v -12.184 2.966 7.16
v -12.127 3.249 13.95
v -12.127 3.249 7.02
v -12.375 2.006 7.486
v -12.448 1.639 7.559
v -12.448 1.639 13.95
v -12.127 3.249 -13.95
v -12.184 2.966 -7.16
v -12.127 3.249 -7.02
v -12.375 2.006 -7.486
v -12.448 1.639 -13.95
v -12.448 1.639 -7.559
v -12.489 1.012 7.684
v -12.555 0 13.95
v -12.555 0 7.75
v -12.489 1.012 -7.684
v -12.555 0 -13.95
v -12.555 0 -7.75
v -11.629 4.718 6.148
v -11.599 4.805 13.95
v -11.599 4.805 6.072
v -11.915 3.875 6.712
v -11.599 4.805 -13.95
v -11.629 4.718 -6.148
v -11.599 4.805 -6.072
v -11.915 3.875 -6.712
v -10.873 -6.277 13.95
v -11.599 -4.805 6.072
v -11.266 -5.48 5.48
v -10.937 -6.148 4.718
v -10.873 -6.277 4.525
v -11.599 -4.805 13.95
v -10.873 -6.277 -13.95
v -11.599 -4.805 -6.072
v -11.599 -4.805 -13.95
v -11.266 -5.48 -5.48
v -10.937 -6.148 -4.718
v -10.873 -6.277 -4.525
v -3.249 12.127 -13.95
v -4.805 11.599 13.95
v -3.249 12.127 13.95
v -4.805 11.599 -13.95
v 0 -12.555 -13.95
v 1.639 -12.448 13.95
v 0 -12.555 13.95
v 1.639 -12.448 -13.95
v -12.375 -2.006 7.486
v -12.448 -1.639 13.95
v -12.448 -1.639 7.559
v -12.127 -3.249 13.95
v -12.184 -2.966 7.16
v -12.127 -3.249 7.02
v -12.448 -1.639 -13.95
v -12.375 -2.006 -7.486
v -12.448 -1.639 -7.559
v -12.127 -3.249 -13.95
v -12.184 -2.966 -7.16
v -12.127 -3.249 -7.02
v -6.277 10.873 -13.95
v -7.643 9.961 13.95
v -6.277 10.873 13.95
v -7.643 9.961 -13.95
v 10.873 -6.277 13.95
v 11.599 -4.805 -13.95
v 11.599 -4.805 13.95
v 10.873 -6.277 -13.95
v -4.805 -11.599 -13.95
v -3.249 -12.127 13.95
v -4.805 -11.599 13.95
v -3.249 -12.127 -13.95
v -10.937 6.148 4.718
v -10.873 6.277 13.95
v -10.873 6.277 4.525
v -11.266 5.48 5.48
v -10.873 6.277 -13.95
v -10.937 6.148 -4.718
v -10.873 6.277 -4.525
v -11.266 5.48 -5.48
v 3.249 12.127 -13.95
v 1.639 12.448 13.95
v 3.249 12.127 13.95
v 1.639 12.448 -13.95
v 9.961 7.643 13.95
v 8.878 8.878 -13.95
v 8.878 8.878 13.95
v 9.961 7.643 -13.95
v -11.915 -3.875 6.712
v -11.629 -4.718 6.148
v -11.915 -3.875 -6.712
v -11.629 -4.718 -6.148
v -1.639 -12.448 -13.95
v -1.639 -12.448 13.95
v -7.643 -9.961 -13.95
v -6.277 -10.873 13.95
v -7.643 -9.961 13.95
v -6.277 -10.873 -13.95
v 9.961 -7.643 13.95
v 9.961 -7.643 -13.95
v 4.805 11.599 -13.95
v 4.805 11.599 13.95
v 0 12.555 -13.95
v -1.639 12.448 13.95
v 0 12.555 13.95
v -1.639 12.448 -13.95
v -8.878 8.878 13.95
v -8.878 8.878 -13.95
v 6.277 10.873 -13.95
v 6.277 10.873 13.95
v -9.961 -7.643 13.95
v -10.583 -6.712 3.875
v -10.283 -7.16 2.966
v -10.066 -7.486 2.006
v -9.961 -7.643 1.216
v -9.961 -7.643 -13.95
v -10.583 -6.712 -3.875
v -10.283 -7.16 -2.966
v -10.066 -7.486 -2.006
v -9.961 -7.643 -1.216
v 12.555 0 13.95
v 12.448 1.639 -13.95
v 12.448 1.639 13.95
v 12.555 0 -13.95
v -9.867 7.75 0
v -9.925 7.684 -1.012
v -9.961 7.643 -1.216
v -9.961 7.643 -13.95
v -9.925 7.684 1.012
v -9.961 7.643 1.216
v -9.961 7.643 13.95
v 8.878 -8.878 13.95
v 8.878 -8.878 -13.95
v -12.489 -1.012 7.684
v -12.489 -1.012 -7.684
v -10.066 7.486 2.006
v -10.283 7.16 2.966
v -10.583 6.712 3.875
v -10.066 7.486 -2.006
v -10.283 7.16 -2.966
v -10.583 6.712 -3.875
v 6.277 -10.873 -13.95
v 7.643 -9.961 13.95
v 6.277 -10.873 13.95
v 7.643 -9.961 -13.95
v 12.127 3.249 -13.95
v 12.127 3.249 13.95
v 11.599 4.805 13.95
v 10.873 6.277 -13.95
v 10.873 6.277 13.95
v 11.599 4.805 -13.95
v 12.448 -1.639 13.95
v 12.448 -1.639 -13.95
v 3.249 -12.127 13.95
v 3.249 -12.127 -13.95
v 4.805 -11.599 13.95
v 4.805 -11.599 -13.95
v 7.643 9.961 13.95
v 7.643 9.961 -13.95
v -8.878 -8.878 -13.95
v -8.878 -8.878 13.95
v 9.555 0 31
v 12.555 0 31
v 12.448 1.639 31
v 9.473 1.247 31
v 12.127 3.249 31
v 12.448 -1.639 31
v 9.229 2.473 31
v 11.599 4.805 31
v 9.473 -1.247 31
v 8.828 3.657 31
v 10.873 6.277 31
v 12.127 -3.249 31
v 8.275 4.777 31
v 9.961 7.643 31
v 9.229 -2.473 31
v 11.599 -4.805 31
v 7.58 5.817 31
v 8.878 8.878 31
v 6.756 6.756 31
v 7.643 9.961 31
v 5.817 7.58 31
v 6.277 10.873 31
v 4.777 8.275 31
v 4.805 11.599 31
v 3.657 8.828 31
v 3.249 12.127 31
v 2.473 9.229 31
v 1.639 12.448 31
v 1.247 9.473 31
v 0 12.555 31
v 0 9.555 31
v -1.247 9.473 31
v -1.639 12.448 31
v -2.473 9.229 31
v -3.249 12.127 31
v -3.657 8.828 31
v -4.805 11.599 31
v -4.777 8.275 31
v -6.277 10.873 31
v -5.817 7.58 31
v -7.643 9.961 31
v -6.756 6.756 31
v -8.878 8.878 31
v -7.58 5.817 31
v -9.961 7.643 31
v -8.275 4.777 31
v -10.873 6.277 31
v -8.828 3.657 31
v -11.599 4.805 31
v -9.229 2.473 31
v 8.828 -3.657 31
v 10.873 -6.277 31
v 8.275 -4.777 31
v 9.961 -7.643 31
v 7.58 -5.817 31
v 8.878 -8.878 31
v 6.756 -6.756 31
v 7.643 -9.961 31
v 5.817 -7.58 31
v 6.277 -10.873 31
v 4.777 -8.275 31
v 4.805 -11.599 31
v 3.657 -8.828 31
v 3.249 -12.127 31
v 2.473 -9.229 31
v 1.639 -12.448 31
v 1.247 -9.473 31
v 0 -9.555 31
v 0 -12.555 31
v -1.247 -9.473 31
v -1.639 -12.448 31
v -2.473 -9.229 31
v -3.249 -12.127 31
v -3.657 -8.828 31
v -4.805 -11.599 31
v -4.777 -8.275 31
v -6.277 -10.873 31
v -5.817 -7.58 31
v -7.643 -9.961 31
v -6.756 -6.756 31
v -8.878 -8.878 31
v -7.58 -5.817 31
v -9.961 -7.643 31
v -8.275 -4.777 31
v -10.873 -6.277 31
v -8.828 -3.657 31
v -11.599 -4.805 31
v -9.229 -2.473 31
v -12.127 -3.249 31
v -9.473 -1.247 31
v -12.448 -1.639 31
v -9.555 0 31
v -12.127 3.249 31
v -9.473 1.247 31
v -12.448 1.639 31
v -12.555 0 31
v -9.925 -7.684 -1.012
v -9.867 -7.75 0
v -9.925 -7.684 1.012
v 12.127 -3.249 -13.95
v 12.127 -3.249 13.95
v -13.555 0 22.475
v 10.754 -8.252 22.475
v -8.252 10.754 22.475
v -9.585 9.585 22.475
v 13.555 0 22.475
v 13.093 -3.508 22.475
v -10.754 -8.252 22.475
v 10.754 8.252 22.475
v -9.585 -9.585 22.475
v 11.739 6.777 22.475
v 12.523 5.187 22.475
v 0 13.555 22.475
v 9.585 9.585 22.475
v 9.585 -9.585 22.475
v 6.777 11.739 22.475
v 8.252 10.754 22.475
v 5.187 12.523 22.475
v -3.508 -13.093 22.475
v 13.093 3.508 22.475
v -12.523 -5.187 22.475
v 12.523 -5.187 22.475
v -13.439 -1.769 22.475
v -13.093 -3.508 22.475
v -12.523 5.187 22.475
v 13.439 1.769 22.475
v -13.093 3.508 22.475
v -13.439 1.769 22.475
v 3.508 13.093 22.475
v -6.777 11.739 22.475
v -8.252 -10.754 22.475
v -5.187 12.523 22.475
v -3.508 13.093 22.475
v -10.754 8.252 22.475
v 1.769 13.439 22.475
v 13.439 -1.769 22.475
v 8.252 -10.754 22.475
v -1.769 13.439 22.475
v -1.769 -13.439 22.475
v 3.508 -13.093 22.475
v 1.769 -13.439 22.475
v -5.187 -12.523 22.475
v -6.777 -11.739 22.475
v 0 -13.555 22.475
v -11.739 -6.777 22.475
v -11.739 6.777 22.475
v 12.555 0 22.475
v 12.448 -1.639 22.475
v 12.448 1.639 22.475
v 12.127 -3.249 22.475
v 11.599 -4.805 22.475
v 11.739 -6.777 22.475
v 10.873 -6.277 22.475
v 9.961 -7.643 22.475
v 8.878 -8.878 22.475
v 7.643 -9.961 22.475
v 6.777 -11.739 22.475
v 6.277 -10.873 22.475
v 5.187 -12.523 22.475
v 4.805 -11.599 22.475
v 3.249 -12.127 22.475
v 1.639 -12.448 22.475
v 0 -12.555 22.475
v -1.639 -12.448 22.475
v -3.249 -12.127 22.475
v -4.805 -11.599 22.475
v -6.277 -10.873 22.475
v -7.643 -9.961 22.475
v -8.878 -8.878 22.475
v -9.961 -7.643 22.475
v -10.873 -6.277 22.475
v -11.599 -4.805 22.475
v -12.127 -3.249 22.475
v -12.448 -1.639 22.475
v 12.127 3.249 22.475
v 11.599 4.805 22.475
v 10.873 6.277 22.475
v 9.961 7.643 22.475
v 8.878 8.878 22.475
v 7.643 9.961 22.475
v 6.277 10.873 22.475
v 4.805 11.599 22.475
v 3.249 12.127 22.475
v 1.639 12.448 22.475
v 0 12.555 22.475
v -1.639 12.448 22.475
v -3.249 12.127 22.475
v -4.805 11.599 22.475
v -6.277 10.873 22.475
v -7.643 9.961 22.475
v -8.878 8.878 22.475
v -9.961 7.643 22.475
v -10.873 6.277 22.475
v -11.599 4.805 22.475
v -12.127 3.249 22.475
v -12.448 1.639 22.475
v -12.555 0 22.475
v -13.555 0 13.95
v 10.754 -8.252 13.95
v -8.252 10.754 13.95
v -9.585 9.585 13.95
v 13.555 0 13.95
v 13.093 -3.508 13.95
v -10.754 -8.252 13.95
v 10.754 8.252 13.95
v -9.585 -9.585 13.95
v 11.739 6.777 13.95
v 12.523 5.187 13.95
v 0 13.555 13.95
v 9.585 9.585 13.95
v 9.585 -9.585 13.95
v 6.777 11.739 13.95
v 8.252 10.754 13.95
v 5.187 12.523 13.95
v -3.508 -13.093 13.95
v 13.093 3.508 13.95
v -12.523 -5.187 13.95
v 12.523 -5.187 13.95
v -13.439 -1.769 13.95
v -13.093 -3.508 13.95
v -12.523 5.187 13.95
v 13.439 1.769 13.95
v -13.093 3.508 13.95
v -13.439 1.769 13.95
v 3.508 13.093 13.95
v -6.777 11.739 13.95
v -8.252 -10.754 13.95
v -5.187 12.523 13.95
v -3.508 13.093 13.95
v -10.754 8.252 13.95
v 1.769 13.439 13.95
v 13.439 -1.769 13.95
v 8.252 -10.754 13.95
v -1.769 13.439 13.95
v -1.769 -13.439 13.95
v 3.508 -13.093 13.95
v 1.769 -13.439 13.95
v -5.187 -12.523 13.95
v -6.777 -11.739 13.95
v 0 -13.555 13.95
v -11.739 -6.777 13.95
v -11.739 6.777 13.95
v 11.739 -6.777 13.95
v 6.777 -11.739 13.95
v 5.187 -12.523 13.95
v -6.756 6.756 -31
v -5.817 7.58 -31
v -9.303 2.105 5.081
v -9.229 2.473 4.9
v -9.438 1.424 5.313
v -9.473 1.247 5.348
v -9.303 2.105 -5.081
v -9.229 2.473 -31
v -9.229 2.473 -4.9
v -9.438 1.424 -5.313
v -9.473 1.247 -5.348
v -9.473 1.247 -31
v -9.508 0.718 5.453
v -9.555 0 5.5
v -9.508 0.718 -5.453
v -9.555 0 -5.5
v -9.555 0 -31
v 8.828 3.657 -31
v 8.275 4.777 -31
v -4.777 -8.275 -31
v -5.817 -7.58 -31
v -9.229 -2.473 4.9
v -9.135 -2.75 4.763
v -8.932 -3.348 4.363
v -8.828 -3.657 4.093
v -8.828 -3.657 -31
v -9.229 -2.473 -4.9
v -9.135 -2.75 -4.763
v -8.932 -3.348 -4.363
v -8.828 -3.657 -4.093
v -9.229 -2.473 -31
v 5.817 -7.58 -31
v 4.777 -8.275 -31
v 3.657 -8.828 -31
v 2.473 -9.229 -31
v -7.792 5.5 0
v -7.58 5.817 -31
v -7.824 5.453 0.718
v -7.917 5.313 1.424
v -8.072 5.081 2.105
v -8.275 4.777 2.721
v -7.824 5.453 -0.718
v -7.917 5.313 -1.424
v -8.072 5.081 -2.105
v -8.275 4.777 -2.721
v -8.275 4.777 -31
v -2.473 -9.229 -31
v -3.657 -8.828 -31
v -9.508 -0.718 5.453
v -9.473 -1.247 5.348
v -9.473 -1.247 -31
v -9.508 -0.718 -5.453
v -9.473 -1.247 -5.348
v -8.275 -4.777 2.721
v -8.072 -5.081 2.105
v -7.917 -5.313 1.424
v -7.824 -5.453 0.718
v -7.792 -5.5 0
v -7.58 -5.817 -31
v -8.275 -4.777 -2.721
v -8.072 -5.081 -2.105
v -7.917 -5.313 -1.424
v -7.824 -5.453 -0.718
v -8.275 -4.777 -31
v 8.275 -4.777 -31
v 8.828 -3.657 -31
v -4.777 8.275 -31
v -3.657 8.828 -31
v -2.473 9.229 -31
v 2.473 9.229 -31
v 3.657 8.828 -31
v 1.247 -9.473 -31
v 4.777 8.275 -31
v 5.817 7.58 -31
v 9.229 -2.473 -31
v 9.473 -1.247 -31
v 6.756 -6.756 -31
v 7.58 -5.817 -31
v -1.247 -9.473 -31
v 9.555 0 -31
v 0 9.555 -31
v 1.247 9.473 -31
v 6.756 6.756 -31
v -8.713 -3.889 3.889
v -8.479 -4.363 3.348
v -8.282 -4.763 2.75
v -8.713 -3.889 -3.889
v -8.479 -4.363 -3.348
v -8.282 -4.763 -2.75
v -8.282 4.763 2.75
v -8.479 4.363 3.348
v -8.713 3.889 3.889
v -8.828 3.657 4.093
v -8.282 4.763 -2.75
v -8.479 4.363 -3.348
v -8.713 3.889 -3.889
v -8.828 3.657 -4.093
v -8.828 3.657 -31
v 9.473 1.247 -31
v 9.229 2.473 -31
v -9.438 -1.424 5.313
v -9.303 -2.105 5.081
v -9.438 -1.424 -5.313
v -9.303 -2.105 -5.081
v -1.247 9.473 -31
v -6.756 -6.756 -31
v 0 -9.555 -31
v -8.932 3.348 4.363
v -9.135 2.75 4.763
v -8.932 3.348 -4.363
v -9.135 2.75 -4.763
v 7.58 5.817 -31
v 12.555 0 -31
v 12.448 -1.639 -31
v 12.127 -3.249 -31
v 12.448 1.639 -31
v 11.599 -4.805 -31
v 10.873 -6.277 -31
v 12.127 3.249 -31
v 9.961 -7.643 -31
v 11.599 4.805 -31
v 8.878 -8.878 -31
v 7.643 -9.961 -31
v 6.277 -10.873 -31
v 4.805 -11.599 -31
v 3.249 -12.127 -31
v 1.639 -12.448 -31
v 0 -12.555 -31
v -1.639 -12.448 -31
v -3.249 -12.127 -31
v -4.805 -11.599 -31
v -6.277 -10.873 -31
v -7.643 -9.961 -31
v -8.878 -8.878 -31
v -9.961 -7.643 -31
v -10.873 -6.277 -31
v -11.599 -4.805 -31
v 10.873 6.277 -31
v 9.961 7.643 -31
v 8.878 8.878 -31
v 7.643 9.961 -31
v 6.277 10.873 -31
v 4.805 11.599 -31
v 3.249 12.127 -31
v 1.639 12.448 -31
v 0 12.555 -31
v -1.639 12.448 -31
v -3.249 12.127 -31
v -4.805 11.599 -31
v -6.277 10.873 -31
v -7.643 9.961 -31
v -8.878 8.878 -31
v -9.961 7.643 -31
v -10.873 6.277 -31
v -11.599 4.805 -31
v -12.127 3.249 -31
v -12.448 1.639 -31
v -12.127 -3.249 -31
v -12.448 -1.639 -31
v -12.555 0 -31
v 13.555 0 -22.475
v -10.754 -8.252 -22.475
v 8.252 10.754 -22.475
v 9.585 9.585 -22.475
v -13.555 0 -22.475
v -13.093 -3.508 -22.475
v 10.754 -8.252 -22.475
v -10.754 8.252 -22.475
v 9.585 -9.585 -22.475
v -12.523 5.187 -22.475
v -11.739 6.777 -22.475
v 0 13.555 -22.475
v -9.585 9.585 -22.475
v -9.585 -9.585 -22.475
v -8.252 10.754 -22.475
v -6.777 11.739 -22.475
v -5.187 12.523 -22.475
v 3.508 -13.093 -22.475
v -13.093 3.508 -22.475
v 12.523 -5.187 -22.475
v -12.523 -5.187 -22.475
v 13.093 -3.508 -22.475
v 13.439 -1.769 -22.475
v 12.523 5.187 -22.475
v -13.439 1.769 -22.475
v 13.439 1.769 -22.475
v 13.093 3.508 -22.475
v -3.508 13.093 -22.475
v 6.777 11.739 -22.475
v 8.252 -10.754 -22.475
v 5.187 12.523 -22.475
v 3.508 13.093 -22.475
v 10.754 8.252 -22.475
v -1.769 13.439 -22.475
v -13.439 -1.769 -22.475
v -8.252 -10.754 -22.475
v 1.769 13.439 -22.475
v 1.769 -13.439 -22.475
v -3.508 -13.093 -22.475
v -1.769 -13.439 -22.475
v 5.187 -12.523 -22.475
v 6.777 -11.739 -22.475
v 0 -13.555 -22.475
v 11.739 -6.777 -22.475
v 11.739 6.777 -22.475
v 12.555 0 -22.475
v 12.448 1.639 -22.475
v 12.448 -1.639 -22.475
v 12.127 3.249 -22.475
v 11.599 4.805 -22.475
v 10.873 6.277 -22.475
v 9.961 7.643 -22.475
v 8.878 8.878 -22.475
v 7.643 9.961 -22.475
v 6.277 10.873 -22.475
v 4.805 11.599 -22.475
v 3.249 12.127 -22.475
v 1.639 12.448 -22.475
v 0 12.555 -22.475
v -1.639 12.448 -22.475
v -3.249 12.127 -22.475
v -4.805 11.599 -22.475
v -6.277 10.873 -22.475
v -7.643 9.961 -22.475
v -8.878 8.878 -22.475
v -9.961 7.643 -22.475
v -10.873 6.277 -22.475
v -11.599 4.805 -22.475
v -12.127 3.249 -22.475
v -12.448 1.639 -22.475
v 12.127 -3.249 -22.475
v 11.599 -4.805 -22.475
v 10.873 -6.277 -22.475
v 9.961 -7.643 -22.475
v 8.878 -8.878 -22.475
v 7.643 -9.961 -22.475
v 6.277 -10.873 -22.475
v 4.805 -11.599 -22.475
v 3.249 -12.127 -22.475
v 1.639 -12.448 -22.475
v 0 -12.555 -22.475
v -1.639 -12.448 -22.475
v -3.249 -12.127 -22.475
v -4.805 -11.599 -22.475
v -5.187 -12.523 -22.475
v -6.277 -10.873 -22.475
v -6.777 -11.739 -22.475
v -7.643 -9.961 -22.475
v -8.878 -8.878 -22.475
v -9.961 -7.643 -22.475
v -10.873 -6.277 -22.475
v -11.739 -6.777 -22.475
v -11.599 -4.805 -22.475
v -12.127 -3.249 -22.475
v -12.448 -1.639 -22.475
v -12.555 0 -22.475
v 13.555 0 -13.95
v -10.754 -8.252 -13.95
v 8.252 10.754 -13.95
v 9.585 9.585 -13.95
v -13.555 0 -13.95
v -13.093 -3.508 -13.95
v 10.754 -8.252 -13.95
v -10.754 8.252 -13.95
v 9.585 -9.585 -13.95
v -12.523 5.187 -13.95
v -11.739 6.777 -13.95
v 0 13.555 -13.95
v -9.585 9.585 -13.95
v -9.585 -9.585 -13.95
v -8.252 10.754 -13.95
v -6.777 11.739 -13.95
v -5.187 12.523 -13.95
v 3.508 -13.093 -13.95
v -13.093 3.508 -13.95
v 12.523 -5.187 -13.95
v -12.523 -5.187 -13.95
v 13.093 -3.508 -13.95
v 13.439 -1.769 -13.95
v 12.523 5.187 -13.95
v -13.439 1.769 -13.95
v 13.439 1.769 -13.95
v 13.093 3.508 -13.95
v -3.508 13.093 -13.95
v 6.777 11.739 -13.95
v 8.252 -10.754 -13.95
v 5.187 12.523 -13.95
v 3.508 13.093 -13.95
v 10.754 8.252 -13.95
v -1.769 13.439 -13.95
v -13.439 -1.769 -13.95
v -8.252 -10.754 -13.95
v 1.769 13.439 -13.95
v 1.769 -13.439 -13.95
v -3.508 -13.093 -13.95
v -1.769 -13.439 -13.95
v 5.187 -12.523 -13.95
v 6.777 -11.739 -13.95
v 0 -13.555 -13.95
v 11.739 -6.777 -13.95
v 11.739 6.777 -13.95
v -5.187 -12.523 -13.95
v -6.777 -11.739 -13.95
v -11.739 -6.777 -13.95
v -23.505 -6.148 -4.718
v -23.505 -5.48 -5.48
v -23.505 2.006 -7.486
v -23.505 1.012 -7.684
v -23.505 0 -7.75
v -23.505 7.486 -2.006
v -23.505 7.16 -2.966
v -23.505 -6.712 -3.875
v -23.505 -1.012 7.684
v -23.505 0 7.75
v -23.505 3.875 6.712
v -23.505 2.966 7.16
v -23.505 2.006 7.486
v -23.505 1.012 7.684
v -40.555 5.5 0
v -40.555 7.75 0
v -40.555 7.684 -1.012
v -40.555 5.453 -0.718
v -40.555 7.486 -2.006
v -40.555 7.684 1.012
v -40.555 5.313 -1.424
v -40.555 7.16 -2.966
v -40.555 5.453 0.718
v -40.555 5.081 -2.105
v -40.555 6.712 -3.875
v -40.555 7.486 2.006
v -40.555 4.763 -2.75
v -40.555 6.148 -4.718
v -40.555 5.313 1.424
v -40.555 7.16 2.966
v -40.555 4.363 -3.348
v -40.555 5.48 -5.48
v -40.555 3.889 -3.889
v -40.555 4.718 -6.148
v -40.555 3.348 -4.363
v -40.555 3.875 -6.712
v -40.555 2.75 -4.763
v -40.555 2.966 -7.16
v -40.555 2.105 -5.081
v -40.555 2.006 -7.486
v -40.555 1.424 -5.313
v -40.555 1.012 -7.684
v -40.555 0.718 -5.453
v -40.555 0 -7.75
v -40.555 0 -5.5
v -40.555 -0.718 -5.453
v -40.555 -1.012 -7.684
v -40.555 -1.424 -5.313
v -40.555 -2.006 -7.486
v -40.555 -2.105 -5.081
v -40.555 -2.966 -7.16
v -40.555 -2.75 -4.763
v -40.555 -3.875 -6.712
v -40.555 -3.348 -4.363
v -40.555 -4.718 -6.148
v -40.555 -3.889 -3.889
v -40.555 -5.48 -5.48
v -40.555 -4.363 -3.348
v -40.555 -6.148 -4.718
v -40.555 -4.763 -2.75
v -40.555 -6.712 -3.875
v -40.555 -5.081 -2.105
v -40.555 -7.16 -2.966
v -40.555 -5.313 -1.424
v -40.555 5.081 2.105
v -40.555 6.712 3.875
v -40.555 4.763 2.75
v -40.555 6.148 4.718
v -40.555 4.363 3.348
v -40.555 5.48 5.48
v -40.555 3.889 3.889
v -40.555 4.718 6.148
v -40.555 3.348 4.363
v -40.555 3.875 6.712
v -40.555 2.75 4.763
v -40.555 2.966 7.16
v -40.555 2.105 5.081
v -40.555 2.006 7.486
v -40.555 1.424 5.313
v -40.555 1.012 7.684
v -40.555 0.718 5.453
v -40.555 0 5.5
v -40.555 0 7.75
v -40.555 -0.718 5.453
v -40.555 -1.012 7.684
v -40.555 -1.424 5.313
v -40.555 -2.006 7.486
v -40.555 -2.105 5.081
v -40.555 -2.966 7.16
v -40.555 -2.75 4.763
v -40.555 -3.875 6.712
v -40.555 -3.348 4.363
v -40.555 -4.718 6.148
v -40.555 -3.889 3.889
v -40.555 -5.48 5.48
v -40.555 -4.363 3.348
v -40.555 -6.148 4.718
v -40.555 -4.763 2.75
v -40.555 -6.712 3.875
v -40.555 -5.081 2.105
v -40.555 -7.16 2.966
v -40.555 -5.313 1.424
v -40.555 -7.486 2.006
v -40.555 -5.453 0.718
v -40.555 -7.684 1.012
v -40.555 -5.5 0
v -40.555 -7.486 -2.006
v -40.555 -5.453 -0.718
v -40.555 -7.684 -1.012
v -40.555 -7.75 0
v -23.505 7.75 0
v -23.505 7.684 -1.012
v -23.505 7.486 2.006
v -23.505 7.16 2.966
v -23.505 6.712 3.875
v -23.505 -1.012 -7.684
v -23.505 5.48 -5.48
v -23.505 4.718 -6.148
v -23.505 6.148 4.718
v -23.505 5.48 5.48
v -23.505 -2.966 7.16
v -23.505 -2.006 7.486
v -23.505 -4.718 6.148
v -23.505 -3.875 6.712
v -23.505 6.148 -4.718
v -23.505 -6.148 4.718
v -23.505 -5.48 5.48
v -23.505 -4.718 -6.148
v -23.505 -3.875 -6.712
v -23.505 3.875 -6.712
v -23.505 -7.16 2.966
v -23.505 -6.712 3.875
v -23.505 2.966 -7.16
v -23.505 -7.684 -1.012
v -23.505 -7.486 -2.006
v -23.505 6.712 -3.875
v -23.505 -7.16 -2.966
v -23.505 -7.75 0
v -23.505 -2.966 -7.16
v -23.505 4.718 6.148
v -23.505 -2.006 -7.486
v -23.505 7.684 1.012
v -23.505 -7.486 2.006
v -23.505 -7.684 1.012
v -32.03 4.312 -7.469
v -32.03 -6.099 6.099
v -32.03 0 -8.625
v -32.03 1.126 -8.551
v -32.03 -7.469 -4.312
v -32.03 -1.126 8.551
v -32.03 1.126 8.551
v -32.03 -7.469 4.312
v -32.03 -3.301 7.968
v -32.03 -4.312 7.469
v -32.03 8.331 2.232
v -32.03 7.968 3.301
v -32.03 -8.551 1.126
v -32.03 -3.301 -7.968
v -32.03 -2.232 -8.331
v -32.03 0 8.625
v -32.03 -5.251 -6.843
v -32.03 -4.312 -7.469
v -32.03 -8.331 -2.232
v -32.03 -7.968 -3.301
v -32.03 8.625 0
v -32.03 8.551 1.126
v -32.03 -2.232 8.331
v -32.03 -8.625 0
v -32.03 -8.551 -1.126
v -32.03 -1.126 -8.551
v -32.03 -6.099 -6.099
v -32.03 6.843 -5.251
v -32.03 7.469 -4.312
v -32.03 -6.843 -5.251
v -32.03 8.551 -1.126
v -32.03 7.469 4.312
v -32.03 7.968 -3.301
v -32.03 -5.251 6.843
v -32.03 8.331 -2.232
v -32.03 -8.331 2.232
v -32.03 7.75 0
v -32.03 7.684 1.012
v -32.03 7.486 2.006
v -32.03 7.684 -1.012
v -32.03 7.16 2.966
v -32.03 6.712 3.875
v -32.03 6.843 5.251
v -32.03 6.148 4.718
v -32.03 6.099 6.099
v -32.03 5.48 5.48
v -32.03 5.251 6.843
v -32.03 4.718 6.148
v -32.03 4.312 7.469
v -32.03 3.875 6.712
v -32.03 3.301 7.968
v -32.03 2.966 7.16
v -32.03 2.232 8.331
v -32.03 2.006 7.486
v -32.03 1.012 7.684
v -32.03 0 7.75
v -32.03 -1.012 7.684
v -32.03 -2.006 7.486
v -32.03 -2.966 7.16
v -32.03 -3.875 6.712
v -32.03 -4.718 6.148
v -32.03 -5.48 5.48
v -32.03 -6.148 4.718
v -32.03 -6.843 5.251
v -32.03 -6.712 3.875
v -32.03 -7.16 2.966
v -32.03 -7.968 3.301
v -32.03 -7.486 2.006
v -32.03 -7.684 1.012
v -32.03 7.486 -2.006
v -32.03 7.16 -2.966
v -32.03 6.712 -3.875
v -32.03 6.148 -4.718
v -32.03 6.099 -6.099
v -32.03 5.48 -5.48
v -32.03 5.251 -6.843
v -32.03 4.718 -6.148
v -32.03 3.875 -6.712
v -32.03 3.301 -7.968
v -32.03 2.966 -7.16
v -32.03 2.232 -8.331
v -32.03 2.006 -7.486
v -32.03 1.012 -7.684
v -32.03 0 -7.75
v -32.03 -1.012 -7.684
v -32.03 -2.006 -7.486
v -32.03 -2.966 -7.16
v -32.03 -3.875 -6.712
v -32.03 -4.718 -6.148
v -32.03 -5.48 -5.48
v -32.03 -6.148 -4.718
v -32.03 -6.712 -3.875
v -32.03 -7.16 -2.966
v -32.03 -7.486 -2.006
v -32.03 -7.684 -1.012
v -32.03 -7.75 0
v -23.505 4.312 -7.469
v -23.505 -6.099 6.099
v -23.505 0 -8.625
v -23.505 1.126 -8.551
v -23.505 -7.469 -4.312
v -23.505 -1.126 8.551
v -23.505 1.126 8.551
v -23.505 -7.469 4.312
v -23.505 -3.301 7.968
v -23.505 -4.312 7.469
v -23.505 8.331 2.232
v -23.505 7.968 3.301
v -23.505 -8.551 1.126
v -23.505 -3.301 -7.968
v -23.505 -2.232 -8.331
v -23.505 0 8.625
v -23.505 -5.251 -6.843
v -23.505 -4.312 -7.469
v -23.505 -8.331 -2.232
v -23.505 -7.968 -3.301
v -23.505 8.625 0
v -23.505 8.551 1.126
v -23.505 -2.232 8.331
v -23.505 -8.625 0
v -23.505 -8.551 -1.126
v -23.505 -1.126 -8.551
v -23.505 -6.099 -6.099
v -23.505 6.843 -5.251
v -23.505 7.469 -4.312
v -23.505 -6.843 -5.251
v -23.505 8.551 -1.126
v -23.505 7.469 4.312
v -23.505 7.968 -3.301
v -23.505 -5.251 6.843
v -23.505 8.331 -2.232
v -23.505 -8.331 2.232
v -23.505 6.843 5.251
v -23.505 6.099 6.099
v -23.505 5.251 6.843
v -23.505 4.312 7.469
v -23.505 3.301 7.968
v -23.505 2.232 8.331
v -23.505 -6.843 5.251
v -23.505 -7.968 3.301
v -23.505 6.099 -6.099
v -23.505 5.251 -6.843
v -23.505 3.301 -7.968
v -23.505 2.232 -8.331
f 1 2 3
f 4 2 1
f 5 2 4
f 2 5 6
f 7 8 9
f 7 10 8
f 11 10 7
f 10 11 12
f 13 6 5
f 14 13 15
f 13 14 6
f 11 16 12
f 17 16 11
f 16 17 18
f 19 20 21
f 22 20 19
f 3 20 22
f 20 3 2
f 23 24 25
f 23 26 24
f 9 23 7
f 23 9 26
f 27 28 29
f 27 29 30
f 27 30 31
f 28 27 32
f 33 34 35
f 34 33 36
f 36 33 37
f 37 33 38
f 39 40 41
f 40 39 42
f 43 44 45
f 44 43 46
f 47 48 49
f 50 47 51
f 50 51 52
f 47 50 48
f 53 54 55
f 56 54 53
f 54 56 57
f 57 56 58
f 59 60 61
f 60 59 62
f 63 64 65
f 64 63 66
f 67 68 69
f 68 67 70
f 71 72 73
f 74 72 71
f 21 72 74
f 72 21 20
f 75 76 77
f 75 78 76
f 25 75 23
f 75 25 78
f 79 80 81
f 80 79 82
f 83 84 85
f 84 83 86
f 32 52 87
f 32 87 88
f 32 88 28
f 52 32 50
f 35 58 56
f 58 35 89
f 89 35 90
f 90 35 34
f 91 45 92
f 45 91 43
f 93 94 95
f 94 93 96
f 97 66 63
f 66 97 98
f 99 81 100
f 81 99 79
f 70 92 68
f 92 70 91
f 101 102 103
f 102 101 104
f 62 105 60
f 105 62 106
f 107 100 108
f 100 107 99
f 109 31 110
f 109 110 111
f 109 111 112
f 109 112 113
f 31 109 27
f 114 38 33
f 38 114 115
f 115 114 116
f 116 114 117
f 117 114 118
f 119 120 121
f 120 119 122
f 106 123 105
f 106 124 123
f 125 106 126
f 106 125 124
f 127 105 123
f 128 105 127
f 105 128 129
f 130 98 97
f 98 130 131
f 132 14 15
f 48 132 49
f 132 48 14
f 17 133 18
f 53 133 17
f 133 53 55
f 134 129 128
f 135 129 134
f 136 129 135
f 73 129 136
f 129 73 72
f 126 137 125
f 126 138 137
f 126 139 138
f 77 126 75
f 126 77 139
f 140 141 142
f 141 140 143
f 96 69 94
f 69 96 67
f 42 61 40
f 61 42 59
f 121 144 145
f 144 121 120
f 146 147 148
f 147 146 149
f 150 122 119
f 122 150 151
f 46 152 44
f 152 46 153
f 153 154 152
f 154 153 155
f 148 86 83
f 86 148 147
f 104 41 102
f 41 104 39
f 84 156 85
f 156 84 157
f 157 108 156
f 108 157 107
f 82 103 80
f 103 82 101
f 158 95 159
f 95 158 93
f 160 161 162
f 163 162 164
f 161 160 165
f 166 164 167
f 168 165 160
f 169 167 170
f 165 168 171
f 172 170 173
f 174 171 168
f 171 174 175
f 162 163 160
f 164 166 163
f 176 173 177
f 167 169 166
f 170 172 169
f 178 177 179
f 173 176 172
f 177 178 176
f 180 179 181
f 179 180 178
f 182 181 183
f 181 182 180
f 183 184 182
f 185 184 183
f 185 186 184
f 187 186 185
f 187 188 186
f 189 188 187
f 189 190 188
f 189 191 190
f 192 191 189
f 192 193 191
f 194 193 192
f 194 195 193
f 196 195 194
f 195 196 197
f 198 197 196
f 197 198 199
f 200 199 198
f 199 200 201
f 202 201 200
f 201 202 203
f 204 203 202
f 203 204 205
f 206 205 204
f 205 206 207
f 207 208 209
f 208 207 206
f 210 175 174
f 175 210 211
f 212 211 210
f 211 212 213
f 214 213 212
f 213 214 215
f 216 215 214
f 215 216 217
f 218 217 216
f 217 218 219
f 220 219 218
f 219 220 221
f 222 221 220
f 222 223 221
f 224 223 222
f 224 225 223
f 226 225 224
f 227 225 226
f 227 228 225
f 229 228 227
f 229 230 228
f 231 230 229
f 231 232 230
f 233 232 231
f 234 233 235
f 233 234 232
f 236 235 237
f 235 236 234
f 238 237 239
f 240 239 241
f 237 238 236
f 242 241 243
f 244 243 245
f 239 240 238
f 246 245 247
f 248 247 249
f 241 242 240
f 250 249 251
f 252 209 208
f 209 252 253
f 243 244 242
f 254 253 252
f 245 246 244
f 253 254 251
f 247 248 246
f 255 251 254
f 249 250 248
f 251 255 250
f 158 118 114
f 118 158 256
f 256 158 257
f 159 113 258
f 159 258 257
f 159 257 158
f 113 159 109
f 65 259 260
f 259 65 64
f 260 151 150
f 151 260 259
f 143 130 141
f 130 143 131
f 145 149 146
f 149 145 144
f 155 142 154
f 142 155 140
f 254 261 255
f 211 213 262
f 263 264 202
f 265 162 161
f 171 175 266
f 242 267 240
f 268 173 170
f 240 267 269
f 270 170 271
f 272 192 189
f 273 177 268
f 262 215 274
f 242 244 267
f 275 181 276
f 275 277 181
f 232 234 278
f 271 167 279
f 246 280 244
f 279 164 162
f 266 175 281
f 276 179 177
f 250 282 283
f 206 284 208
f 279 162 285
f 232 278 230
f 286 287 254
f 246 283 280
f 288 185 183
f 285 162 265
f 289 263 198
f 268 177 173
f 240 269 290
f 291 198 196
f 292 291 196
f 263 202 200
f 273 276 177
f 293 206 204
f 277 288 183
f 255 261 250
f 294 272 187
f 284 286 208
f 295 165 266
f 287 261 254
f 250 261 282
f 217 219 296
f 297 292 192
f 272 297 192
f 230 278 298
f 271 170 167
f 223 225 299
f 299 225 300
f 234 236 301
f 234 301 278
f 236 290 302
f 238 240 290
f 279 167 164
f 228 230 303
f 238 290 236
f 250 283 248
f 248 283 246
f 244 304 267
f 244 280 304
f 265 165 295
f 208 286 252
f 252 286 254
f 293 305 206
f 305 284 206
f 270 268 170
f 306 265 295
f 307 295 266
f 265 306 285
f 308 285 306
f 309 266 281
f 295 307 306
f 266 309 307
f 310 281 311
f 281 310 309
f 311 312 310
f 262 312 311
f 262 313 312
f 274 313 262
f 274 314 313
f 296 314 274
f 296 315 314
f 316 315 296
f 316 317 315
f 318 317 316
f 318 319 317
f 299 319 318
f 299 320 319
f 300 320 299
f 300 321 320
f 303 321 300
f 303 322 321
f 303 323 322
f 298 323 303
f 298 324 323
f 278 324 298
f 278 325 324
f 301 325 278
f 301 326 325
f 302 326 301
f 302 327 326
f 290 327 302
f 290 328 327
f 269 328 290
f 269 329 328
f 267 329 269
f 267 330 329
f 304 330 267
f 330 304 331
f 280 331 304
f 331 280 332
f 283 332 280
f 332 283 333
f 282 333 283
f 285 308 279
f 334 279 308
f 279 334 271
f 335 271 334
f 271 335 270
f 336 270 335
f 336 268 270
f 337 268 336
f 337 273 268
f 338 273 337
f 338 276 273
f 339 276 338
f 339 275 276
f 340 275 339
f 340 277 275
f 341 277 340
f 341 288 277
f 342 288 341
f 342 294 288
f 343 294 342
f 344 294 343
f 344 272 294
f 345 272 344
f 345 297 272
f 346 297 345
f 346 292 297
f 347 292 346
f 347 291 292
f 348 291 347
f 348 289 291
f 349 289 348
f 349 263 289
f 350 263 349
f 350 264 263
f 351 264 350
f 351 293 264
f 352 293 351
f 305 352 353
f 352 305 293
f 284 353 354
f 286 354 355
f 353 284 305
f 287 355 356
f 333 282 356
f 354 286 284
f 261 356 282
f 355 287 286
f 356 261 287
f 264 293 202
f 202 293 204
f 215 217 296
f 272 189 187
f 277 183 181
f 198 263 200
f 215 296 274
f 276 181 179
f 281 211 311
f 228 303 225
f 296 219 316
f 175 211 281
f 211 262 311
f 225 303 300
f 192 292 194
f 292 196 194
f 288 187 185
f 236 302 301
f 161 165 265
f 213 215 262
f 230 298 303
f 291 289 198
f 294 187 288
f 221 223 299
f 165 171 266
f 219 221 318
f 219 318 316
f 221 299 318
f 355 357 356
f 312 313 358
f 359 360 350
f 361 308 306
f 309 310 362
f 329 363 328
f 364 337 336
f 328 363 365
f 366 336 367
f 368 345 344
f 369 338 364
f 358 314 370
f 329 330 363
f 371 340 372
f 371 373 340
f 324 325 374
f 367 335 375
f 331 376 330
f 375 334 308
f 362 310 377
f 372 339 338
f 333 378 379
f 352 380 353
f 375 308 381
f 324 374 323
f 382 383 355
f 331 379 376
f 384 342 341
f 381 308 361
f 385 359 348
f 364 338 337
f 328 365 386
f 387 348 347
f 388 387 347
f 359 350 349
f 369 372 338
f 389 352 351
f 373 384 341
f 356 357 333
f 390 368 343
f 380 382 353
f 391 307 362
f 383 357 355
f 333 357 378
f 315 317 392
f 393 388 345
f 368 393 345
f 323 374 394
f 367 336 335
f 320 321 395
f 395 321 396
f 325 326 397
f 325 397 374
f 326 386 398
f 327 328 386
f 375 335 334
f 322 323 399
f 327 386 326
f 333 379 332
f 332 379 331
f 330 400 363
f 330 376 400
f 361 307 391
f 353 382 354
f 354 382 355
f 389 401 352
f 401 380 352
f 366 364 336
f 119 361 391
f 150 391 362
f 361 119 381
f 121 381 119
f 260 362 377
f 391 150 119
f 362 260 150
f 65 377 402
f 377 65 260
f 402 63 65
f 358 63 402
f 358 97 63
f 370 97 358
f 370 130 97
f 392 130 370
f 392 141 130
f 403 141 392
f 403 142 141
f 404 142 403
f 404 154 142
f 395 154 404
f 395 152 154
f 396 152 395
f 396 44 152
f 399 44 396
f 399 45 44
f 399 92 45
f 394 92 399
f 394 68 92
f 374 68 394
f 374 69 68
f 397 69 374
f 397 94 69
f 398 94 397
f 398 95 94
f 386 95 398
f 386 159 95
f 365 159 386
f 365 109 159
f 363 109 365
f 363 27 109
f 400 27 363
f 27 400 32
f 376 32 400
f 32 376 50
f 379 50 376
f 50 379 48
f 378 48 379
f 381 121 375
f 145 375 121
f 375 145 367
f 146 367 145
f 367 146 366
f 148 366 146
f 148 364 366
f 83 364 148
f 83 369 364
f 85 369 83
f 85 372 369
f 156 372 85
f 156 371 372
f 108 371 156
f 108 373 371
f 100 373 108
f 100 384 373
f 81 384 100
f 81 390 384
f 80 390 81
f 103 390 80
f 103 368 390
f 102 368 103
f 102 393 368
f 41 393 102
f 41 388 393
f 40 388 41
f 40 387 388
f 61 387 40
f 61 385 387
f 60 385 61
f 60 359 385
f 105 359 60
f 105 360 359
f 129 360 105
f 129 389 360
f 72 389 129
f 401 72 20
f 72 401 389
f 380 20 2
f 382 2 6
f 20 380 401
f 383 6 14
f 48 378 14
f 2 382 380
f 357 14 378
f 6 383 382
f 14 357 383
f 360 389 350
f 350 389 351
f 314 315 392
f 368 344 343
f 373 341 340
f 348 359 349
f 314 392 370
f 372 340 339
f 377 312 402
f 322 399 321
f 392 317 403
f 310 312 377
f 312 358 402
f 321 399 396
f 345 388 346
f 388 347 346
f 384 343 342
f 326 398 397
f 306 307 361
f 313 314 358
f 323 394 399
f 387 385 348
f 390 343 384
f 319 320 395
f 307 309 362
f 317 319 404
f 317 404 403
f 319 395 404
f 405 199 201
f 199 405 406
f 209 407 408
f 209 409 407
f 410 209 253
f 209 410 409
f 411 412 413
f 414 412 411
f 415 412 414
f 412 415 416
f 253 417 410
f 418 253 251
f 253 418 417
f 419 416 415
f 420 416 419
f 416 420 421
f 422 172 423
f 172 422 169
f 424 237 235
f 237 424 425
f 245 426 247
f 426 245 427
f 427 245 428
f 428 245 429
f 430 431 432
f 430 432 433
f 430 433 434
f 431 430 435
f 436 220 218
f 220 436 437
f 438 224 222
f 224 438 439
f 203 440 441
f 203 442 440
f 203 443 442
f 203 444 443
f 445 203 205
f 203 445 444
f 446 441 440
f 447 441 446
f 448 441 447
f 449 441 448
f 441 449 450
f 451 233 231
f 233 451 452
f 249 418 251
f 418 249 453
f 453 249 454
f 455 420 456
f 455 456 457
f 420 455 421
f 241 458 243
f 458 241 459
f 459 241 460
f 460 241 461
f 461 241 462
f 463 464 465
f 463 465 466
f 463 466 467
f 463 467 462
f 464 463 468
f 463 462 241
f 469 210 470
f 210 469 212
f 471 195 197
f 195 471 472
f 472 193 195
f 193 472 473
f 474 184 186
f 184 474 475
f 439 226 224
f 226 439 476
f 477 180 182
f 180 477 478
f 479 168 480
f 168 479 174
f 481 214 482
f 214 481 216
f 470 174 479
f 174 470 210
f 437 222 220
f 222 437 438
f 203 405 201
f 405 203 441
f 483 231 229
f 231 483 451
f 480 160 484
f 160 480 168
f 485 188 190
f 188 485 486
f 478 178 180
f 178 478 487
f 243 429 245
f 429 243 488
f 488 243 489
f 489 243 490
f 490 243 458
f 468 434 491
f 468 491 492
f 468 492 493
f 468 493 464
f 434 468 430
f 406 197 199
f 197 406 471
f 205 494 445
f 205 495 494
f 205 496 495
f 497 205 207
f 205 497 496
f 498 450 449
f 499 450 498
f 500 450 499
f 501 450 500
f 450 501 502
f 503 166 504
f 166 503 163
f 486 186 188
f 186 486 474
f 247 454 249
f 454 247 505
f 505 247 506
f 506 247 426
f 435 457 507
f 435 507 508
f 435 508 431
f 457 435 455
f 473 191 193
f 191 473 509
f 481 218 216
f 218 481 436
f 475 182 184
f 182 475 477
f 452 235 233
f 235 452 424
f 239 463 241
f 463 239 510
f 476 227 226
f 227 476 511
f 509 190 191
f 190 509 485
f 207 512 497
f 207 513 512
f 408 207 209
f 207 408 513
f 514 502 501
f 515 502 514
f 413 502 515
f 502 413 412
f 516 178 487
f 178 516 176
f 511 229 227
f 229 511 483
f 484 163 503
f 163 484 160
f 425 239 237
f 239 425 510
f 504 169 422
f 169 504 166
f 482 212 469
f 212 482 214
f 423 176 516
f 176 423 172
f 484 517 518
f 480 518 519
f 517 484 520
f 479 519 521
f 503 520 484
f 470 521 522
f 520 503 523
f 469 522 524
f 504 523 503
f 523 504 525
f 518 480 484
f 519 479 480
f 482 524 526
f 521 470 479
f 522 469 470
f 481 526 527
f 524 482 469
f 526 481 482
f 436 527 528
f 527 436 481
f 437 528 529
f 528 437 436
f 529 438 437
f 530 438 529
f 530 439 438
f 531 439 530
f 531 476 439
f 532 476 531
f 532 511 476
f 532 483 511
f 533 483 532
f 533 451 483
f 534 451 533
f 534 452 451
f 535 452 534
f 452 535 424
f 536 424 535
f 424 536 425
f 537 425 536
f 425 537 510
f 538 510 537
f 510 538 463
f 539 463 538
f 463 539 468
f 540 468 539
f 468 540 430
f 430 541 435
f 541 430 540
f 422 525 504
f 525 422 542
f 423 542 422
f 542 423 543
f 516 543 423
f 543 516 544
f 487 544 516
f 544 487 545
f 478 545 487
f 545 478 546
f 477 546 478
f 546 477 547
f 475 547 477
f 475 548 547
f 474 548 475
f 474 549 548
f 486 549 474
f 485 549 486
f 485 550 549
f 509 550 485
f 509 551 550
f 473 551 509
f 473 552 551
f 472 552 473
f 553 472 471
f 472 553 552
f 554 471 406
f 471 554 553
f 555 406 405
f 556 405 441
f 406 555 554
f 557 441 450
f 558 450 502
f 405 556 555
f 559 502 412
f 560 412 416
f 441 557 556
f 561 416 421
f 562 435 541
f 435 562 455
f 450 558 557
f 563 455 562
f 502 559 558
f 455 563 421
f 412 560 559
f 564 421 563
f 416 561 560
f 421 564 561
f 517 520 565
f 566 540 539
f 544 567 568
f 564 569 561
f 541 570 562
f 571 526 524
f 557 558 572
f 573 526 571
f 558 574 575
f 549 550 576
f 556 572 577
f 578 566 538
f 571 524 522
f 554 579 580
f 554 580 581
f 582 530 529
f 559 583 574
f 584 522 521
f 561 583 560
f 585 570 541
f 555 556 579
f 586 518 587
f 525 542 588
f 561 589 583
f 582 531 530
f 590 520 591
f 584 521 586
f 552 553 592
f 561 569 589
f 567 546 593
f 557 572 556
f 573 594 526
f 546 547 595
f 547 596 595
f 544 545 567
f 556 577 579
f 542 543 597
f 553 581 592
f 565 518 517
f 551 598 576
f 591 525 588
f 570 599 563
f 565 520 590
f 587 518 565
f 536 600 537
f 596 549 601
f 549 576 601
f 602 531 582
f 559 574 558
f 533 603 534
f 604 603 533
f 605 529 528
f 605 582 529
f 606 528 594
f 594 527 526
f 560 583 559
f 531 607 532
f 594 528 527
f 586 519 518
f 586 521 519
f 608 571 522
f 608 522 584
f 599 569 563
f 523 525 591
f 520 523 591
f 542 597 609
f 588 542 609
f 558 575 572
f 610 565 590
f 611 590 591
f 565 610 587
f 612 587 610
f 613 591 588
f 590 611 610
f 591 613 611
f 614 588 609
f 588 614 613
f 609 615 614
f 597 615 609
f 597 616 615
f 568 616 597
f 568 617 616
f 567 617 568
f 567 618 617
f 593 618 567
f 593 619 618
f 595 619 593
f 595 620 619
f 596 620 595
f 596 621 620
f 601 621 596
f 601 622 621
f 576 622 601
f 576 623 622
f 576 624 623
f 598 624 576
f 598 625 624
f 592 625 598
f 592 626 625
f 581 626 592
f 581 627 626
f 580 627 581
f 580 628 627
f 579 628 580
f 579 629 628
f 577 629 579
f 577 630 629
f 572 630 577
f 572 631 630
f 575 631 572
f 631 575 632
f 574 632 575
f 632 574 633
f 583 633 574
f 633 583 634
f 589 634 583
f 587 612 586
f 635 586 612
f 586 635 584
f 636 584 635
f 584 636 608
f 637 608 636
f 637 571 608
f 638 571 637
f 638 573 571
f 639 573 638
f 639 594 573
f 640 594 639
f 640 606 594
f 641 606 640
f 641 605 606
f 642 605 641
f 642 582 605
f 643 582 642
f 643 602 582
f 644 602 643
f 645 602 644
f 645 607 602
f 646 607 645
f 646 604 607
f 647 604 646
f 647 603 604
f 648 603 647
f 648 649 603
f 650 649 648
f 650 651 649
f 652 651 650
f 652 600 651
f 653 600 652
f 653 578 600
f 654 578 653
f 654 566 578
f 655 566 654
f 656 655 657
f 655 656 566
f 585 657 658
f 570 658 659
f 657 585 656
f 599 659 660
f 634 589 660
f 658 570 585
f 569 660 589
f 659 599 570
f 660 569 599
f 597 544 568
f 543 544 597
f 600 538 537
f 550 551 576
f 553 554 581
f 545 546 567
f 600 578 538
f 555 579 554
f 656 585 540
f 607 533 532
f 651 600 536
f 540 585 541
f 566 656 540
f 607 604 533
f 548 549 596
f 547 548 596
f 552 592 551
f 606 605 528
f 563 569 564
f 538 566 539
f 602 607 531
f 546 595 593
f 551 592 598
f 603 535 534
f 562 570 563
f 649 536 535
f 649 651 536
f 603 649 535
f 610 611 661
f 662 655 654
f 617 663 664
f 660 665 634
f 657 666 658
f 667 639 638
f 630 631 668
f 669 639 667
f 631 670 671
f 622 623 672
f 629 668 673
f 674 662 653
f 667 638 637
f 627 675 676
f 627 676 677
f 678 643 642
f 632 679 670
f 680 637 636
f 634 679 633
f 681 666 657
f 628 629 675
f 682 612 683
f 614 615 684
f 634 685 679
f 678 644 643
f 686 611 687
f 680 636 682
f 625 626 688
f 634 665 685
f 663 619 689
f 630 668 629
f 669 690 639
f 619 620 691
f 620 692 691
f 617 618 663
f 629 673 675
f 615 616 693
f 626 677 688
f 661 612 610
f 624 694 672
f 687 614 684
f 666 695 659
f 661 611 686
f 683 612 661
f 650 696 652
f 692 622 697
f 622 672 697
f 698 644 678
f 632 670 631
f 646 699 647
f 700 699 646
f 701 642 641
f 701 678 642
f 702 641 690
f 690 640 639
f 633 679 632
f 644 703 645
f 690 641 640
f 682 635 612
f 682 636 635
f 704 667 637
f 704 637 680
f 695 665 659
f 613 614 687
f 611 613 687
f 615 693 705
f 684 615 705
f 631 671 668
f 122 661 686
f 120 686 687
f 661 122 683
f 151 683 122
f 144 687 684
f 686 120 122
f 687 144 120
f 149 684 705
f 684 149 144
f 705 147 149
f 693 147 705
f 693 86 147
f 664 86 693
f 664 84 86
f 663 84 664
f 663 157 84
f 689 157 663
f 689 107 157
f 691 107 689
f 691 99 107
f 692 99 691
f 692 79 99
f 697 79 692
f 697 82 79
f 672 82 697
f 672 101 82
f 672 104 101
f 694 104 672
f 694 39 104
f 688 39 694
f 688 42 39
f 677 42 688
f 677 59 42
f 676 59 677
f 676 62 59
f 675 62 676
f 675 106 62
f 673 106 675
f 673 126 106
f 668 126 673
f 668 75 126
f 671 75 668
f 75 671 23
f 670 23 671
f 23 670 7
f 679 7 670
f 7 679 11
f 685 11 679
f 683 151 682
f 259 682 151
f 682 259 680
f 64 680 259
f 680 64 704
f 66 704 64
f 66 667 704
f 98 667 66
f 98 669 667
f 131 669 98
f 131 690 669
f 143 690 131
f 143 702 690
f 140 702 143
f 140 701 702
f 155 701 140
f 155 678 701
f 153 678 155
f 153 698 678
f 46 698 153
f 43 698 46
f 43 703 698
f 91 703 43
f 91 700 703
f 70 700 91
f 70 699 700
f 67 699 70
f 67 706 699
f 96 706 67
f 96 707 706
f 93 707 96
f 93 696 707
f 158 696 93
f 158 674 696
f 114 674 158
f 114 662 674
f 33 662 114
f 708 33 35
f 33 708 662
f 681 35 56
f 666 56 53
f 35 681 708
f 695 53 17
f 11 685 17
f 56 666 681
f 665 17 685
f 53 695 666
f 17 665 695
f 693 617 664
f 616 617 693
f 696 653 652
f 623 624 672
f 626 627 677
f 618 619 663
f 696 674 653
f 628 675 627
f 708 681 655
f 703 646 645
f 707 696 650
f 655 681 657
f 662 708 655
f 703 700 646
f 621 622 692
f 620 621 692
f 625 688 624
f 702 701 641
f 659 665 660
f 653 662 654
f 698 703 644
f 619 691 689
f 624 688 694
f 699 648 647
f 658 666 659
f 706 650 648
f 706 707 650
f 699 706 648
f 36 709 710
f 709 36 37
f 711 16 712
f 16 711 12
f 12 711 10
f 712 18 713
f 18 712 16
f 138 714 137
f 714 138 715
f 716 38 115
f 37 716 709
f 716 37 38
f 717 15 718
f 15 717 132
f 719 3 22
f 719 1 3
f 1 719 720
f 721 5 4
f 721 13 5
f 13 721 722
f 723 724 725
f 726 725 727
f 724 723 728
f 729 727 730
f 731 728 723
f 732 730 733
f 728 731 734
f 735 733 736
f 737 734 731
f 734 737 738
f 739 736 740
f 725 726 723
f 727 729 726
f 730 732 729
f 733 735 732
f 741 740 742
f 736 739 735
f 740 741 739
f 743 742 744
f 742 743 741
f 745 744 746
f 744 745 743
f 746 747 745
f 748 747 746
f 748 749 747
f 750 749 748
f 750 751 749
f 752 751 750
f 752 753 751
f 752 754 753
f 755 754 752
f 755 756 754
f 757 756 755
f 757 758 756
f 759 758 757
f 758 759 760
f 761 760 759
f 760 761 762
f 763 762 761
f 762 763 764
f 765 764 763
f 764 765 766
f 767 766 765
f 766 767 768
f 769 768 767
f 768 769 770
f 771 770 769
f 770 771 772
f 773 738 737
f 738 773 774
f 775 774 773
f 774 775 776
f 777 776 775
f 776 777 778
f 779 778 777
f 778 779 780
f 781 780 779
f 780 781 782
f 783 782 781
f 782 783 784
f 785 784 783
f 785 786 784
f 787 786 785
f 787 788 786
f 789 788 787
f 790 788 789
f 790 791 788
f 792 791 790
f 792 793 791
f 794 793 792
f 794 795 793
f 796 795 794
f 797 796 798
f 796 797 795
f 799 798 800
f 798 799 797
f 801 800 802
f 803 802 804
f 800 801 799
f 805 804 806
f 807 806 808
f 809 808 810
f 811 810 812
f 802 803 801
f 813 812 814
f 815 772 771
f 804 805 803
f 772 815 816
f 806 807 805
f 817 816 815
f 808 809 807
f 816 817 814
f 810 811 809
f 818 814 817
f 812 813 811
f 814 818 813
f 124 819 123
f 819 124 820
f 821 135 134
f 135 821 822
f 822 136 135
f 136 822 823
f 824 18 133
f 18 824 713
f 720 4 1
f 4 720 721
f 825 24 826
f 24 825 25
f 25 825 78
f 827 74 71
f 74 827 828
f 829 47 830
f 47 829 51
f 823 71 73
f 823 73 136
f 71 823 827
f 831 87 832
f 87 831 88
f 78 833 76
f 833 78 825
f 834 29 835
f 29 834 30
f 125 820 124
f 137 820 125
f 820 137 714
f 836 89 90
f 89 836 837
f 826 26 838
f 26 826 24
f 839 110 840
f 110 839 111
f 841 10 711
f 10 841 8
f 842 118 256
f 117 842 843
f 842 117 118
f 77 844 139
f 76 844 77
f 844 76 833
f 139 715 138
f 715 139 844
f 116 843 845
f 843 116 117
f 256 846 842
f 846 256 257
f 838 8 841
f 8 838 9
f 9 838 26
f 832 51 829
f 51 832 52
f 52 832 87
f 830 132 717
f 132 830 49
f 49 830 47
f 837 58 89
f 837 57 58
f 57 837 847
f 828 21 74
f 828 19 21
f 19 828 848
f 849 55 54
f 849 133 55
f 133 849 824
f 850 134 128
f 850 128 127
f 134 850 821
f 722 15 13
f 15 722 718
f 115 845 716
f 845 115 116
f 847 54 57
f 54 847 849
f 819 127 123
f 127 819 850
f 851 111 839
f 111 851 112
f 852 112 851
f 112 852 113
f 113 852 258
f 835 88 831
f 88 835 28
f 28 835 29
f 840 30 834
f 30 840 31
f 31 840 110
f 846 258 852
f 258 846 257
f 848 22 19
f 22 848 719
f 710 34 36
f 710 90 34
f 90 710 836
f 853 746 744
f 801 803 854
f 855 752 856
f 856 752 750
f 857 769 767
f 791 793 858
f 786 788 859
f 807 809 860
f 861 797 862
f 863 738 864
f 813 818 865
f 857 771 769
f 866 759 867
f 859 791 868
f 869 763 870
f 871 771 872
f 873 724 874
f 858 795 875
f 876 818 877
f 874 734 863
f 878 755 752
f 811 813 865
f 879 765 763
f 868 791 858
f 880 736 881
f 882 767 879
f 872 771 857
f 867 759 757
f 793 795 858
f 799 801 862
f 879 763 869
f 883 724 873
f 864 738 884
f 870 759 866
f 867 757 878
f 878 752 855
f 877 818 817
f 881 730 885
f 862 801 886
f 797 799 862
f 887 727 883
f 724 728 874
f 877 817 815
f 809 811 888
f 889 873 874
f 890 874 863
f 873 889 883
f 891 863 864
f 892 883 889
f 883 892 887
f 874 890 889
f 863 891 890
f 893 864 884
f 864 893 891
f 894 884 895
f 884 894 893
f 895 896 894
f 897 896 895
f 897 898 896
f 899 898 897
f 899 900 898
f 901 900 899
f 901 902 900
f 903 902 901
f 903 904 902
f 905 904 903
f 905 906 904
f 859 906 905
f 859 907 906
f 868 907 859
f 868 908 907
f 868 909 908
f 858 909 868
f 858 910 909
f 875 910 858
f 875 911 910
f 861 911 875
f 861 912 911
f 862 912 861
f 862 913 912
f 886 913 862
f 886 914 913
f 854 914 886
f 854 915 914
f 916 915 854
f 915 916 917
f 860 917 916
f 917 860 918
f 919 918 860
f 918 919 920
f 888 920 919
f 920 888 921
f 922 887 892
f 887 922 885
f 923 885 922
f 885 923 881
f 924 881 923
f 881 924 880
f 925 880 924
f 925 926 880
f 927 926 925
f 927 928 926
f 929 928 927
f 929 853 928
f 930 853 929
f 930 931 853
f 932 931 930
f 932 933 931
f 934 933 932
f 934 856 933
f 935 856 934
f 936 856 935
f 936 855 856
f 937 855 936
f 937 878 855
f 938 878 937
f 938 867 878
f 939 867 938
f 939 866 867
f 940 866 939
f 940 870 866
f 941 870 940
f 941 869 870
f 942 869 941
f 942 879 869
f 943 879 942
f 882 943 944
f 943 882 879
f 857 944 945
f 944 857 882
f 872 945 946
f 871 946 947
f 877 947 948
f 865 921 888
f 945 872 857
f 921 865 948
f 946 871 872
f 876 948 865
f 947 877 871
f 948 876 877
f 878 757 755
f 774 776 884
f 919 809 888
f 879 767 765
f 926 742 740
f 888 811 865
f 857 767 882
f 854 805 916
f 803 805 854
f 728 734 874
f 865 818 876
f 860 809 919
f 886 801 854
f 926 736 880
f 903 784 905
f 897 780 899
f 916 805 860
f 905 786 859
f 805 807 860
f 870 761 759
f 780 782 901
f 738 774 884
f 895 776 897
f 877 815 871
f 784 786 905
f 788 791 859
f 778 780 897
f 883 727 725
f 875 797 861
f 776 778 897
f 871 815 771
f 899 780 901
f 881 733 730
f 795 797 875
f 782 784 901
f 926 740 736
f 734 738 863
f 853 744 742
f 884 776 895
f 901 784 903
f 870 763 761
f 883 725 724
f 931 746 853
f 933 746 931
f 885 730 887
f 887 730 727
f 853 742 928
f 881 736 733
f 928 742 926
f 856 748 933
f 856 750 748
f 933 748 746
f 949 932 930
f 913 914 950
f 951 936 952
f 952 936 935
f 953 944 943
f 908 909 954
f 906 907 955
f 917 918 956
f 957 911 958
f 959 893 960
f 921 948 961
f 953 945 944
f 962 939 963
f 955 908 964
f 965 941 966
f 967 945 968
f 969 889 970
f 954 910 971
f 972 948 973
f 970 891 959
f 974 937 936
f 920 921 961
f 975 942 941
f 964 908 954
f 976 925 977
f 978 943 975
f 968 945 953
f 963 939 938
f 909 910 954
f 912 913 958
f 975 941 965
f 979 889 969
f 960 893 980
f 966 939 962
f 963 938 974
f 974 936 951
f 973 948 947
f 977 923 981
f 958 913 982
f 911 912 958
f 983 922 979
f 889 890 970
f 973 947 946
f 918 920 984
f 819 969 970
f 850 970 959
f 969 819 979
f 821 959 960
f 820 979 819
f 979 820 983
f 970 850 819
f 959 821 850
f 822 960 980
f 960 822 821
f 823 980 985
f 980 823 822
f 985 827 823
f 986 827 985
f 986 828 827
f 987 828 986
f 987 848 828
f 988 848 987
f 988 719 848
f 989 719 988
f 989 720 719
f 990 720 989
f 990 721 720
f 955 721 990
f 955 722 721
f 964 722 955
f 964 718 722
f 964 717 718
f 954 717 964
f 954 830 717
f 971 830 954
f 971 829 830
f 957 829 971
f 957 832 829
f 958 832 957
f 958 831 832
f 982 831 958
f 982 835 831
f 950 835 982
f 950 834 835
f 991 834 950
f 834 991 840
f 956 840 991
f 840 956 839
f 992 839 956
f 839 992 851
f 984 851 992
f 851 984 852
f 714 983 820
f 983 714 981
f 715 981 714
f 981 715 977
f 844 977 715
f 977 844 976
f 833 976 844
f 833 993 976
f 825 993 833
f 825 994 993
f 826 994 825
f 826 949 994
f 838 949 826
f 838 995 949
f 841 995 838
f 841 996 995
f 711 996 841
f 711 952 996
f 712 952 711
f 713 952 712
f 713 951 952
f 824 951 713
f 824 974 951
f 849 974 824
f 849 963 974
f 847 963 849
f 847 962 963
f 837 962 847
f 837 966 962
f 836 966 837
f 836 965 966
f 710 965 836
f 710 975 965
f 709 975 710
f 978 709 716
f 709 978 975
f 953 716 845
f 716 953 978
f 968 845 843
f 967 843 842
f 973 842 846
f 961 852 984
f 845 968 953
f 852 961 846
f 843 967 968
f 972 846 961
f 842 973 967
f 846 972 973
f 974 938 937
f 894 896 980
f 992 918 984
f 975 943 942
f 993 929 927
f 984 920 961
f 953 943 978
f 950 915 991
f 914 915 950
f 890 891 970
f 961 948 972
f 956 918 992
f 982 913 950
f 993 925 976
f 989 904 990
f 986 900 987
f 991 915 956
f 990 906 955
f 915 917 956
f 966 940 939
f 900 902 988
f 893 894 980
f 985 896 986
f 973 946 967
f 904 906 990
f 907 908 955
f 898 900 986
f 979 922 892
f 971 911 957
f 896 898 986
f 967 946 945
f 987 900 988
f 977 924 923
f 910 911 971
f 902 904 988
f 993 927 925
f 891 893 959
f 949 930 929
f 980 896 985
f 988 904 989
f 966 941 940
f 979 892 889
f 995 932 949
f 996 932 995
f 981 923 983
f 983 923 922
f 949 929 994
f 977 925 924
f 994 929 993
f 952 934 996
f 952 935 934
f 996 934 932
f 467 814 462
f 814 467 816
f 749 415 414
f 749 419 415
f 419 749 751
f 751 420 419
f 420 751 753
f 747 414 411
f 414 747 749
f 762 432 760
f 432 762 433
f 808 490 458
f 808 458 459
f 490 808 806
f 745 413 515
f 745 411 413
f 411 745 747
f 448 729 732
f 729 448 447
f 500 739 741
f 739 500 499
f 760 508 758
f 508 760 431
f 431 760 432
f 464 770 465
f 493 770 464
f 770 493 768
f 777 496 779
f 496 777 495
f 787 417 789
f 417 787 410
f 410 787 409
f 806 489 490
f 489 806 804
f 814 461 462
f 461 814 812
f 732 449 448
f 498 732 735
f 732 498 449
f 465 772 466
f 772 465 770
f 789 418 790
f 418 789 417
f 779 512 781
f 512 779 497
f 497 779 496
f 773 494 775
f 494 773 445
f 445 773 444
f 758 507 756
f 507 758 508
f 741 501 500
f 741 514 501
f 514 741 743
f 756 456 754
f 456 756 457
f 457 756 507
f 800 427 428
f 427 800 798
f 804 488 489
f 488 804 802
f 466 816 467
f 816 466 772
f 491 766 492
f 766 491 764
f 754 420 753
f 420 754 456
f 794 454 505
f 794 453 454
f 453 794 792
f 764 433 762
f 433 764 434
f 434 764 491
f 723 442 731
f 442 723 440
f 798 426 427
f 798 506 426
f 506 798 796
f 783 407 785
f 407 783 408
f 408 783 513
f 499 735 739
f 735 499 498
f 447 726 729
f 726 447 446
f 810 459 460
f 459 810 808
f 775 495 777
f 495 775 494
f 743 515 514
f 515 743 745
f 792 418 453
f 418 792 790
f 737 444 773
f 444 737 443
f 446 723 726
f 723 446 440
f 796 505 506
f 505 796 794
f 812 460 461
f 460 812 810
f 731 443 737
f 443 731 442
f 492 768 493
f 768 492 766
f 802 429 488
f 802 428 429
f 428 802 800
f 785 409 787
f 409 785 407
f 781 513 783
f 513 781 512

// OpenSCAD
// Customizable Hose Tee

//Height of Tee
total_t_length=62;
//Diameter of main part of Tee
main_t_diameter=25.11;
//Height of barbs on Tee
main_t_barb_height=2;
//Wall thickness of main part of Tee
main_t_wall_thickness=3;

//Diameter of Tee portion of Tee
secondary_diameter=15.5;
//Height of barbs on Tee portion of Tee
secondary_barb_height=1.75;
//Wall thickness of Tee portion of Tee
secondary_wall_thickness=2.25;

difference() {
  union() {
    translate([0,0,total_t_length/2]){
      rotate(a=[0,180,0]){
        hose_barb(total_t_length/2, main_t_diameter, main_t_barb_height, main_t_wall_thickness);
      }
    }

    translate([0,0,-total_t_length/2]){
      rotate(a=[0,0,0]){
        hose_barb(total_t_length/2, main_t_diameter, main_t_barb_height, main_t_wall_thickness);
      }
    }
    translate([-(total_t_length/2 + main_t_diameter/2 - main_t_wall_thickness),0,0]){
      rotate(a=[0,90,0]){
        hose_barb(total_t_length/2, secondary_diameter, secondary_barb_height, secondary_wall_thickness);
      }
    }
  }
  rotate(a=[0,90,0]){
    translate([0,0,-total_t_length]){
      cylinder(h=total_t_length, d=secondary_diameter- (secondary_wall_thickness*2), $fn=48);
    }
  }
}



module hose_barb(height, diameter, barb_height, wall_thickness)
{ 
  end_barb_height = height - (height * 0.45);
  difference(){
    union(){
      cylinder(h=height,d=diameter,$fn=48);//pipe
      cylinder(h=end_barb_height/2,d1=diameter,d2=diameter+barb_height,$fn=48);//barb
      translate([0,0,end_barb_height/2]){
        cylinder(h=end_barb_height/2,d1=diameter,d2=diameter+barb_height,$fn=48);//barb
      }
    }
    cylinder(h=height,d=diameter - (wall_thickness*2),$fn=48);//hole
  }
}
